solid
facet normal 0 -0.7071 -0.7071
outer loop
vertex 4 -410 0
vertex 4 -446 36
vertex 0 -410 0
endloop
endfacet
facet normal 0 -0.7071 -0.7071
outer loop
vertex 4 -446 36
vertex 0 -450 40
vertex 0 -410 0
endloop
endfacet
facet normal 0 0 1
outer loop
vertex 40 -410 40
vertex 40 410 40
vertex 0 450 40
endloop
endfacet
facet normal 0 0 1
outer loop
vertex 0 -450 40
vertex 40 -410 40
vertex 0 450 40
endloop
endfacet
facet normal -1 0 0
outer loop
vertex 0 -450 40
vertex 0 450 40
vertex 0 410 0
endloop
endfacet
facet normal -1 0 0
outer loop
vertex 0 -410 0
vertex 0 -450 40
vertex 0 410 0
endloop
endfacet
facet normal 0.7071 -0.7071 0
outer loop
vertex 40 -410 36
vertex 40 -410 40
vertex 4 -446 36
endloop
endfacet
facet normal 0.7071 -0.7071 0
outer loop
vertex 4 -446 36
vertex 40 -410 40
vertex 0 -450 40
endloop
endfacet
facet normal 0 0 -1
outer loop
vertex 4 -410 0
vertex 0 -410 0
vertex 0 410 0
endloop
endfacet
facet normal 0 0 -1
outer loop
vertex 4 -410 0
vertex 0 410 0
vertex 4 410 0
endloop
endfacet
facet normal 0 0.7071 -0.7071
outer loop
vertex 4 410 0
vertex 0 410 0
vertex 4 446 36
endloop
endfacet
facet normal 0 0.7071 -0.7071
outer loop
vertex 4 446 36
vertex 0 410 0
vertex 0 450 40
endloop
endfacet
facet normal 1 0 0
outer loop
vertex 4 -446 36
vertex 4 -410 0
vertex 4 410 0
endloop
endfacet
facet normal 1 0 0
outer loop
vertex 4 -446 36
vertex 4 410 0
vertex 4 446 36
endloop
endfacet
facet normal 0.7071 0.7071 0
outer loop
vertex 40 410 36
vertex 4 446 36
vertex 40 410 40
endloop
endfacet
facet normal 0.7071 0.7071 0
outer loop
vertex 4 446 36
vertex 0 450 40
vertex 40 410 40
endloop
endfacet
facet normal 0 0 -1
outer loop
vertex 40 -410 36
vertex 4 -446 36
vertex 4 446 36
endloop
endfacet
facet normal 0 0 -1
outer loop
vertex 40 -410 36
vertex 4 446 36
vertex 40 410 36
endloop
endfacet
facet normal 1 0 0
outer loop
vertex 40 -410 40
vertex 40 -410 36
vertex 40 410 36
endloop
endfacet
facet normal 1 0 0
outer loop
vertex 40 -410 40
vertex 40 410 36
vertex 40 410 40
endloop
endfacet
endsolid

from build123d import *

# Parameters (mm, degrees)
F1_DEPTH = 450
F3_DEPTH = 40
F5_DEPTH = 40


with BuildPart() as f1:
    # F0 (on Front) → F1 (new body, symmetric)
    with BuildSketch(Plane.XZ):
        Polygon((0, 40), (0, 0), (4, 0), (4, 36), (40, 36), (40, 40), align=None)
    extrude(amount=F1_DEPTH, both=True)

    # F2 (on face) → F3 (cut)
    with BuildSketch(Plane(origin=(0, 0, 0), x_dir=(0, -1, 0), z_dir=(-1, 0, 0))):
        Polygon((-410, 0), (-450, 40), (-450, 0), align=None)
        Polygon((450, 0), (450, 40), (410, 0), align=None)
    extrude(amount=-F3_DEPTH, mode=Mode.SUBTRACT)

    # F4 (on face) → F5 (cut)
    with BuildSketch(Plane.XY.offset(40)):
        Polygon((40, 450), (0, 450), (40, 410), align=None)
        Polygon((40, -410), (0, -450), (40, -450), align=None)
    extrude(amount=-F5_DEPTH, mode=Mode.SUBTRACT)


solid = f1.part
